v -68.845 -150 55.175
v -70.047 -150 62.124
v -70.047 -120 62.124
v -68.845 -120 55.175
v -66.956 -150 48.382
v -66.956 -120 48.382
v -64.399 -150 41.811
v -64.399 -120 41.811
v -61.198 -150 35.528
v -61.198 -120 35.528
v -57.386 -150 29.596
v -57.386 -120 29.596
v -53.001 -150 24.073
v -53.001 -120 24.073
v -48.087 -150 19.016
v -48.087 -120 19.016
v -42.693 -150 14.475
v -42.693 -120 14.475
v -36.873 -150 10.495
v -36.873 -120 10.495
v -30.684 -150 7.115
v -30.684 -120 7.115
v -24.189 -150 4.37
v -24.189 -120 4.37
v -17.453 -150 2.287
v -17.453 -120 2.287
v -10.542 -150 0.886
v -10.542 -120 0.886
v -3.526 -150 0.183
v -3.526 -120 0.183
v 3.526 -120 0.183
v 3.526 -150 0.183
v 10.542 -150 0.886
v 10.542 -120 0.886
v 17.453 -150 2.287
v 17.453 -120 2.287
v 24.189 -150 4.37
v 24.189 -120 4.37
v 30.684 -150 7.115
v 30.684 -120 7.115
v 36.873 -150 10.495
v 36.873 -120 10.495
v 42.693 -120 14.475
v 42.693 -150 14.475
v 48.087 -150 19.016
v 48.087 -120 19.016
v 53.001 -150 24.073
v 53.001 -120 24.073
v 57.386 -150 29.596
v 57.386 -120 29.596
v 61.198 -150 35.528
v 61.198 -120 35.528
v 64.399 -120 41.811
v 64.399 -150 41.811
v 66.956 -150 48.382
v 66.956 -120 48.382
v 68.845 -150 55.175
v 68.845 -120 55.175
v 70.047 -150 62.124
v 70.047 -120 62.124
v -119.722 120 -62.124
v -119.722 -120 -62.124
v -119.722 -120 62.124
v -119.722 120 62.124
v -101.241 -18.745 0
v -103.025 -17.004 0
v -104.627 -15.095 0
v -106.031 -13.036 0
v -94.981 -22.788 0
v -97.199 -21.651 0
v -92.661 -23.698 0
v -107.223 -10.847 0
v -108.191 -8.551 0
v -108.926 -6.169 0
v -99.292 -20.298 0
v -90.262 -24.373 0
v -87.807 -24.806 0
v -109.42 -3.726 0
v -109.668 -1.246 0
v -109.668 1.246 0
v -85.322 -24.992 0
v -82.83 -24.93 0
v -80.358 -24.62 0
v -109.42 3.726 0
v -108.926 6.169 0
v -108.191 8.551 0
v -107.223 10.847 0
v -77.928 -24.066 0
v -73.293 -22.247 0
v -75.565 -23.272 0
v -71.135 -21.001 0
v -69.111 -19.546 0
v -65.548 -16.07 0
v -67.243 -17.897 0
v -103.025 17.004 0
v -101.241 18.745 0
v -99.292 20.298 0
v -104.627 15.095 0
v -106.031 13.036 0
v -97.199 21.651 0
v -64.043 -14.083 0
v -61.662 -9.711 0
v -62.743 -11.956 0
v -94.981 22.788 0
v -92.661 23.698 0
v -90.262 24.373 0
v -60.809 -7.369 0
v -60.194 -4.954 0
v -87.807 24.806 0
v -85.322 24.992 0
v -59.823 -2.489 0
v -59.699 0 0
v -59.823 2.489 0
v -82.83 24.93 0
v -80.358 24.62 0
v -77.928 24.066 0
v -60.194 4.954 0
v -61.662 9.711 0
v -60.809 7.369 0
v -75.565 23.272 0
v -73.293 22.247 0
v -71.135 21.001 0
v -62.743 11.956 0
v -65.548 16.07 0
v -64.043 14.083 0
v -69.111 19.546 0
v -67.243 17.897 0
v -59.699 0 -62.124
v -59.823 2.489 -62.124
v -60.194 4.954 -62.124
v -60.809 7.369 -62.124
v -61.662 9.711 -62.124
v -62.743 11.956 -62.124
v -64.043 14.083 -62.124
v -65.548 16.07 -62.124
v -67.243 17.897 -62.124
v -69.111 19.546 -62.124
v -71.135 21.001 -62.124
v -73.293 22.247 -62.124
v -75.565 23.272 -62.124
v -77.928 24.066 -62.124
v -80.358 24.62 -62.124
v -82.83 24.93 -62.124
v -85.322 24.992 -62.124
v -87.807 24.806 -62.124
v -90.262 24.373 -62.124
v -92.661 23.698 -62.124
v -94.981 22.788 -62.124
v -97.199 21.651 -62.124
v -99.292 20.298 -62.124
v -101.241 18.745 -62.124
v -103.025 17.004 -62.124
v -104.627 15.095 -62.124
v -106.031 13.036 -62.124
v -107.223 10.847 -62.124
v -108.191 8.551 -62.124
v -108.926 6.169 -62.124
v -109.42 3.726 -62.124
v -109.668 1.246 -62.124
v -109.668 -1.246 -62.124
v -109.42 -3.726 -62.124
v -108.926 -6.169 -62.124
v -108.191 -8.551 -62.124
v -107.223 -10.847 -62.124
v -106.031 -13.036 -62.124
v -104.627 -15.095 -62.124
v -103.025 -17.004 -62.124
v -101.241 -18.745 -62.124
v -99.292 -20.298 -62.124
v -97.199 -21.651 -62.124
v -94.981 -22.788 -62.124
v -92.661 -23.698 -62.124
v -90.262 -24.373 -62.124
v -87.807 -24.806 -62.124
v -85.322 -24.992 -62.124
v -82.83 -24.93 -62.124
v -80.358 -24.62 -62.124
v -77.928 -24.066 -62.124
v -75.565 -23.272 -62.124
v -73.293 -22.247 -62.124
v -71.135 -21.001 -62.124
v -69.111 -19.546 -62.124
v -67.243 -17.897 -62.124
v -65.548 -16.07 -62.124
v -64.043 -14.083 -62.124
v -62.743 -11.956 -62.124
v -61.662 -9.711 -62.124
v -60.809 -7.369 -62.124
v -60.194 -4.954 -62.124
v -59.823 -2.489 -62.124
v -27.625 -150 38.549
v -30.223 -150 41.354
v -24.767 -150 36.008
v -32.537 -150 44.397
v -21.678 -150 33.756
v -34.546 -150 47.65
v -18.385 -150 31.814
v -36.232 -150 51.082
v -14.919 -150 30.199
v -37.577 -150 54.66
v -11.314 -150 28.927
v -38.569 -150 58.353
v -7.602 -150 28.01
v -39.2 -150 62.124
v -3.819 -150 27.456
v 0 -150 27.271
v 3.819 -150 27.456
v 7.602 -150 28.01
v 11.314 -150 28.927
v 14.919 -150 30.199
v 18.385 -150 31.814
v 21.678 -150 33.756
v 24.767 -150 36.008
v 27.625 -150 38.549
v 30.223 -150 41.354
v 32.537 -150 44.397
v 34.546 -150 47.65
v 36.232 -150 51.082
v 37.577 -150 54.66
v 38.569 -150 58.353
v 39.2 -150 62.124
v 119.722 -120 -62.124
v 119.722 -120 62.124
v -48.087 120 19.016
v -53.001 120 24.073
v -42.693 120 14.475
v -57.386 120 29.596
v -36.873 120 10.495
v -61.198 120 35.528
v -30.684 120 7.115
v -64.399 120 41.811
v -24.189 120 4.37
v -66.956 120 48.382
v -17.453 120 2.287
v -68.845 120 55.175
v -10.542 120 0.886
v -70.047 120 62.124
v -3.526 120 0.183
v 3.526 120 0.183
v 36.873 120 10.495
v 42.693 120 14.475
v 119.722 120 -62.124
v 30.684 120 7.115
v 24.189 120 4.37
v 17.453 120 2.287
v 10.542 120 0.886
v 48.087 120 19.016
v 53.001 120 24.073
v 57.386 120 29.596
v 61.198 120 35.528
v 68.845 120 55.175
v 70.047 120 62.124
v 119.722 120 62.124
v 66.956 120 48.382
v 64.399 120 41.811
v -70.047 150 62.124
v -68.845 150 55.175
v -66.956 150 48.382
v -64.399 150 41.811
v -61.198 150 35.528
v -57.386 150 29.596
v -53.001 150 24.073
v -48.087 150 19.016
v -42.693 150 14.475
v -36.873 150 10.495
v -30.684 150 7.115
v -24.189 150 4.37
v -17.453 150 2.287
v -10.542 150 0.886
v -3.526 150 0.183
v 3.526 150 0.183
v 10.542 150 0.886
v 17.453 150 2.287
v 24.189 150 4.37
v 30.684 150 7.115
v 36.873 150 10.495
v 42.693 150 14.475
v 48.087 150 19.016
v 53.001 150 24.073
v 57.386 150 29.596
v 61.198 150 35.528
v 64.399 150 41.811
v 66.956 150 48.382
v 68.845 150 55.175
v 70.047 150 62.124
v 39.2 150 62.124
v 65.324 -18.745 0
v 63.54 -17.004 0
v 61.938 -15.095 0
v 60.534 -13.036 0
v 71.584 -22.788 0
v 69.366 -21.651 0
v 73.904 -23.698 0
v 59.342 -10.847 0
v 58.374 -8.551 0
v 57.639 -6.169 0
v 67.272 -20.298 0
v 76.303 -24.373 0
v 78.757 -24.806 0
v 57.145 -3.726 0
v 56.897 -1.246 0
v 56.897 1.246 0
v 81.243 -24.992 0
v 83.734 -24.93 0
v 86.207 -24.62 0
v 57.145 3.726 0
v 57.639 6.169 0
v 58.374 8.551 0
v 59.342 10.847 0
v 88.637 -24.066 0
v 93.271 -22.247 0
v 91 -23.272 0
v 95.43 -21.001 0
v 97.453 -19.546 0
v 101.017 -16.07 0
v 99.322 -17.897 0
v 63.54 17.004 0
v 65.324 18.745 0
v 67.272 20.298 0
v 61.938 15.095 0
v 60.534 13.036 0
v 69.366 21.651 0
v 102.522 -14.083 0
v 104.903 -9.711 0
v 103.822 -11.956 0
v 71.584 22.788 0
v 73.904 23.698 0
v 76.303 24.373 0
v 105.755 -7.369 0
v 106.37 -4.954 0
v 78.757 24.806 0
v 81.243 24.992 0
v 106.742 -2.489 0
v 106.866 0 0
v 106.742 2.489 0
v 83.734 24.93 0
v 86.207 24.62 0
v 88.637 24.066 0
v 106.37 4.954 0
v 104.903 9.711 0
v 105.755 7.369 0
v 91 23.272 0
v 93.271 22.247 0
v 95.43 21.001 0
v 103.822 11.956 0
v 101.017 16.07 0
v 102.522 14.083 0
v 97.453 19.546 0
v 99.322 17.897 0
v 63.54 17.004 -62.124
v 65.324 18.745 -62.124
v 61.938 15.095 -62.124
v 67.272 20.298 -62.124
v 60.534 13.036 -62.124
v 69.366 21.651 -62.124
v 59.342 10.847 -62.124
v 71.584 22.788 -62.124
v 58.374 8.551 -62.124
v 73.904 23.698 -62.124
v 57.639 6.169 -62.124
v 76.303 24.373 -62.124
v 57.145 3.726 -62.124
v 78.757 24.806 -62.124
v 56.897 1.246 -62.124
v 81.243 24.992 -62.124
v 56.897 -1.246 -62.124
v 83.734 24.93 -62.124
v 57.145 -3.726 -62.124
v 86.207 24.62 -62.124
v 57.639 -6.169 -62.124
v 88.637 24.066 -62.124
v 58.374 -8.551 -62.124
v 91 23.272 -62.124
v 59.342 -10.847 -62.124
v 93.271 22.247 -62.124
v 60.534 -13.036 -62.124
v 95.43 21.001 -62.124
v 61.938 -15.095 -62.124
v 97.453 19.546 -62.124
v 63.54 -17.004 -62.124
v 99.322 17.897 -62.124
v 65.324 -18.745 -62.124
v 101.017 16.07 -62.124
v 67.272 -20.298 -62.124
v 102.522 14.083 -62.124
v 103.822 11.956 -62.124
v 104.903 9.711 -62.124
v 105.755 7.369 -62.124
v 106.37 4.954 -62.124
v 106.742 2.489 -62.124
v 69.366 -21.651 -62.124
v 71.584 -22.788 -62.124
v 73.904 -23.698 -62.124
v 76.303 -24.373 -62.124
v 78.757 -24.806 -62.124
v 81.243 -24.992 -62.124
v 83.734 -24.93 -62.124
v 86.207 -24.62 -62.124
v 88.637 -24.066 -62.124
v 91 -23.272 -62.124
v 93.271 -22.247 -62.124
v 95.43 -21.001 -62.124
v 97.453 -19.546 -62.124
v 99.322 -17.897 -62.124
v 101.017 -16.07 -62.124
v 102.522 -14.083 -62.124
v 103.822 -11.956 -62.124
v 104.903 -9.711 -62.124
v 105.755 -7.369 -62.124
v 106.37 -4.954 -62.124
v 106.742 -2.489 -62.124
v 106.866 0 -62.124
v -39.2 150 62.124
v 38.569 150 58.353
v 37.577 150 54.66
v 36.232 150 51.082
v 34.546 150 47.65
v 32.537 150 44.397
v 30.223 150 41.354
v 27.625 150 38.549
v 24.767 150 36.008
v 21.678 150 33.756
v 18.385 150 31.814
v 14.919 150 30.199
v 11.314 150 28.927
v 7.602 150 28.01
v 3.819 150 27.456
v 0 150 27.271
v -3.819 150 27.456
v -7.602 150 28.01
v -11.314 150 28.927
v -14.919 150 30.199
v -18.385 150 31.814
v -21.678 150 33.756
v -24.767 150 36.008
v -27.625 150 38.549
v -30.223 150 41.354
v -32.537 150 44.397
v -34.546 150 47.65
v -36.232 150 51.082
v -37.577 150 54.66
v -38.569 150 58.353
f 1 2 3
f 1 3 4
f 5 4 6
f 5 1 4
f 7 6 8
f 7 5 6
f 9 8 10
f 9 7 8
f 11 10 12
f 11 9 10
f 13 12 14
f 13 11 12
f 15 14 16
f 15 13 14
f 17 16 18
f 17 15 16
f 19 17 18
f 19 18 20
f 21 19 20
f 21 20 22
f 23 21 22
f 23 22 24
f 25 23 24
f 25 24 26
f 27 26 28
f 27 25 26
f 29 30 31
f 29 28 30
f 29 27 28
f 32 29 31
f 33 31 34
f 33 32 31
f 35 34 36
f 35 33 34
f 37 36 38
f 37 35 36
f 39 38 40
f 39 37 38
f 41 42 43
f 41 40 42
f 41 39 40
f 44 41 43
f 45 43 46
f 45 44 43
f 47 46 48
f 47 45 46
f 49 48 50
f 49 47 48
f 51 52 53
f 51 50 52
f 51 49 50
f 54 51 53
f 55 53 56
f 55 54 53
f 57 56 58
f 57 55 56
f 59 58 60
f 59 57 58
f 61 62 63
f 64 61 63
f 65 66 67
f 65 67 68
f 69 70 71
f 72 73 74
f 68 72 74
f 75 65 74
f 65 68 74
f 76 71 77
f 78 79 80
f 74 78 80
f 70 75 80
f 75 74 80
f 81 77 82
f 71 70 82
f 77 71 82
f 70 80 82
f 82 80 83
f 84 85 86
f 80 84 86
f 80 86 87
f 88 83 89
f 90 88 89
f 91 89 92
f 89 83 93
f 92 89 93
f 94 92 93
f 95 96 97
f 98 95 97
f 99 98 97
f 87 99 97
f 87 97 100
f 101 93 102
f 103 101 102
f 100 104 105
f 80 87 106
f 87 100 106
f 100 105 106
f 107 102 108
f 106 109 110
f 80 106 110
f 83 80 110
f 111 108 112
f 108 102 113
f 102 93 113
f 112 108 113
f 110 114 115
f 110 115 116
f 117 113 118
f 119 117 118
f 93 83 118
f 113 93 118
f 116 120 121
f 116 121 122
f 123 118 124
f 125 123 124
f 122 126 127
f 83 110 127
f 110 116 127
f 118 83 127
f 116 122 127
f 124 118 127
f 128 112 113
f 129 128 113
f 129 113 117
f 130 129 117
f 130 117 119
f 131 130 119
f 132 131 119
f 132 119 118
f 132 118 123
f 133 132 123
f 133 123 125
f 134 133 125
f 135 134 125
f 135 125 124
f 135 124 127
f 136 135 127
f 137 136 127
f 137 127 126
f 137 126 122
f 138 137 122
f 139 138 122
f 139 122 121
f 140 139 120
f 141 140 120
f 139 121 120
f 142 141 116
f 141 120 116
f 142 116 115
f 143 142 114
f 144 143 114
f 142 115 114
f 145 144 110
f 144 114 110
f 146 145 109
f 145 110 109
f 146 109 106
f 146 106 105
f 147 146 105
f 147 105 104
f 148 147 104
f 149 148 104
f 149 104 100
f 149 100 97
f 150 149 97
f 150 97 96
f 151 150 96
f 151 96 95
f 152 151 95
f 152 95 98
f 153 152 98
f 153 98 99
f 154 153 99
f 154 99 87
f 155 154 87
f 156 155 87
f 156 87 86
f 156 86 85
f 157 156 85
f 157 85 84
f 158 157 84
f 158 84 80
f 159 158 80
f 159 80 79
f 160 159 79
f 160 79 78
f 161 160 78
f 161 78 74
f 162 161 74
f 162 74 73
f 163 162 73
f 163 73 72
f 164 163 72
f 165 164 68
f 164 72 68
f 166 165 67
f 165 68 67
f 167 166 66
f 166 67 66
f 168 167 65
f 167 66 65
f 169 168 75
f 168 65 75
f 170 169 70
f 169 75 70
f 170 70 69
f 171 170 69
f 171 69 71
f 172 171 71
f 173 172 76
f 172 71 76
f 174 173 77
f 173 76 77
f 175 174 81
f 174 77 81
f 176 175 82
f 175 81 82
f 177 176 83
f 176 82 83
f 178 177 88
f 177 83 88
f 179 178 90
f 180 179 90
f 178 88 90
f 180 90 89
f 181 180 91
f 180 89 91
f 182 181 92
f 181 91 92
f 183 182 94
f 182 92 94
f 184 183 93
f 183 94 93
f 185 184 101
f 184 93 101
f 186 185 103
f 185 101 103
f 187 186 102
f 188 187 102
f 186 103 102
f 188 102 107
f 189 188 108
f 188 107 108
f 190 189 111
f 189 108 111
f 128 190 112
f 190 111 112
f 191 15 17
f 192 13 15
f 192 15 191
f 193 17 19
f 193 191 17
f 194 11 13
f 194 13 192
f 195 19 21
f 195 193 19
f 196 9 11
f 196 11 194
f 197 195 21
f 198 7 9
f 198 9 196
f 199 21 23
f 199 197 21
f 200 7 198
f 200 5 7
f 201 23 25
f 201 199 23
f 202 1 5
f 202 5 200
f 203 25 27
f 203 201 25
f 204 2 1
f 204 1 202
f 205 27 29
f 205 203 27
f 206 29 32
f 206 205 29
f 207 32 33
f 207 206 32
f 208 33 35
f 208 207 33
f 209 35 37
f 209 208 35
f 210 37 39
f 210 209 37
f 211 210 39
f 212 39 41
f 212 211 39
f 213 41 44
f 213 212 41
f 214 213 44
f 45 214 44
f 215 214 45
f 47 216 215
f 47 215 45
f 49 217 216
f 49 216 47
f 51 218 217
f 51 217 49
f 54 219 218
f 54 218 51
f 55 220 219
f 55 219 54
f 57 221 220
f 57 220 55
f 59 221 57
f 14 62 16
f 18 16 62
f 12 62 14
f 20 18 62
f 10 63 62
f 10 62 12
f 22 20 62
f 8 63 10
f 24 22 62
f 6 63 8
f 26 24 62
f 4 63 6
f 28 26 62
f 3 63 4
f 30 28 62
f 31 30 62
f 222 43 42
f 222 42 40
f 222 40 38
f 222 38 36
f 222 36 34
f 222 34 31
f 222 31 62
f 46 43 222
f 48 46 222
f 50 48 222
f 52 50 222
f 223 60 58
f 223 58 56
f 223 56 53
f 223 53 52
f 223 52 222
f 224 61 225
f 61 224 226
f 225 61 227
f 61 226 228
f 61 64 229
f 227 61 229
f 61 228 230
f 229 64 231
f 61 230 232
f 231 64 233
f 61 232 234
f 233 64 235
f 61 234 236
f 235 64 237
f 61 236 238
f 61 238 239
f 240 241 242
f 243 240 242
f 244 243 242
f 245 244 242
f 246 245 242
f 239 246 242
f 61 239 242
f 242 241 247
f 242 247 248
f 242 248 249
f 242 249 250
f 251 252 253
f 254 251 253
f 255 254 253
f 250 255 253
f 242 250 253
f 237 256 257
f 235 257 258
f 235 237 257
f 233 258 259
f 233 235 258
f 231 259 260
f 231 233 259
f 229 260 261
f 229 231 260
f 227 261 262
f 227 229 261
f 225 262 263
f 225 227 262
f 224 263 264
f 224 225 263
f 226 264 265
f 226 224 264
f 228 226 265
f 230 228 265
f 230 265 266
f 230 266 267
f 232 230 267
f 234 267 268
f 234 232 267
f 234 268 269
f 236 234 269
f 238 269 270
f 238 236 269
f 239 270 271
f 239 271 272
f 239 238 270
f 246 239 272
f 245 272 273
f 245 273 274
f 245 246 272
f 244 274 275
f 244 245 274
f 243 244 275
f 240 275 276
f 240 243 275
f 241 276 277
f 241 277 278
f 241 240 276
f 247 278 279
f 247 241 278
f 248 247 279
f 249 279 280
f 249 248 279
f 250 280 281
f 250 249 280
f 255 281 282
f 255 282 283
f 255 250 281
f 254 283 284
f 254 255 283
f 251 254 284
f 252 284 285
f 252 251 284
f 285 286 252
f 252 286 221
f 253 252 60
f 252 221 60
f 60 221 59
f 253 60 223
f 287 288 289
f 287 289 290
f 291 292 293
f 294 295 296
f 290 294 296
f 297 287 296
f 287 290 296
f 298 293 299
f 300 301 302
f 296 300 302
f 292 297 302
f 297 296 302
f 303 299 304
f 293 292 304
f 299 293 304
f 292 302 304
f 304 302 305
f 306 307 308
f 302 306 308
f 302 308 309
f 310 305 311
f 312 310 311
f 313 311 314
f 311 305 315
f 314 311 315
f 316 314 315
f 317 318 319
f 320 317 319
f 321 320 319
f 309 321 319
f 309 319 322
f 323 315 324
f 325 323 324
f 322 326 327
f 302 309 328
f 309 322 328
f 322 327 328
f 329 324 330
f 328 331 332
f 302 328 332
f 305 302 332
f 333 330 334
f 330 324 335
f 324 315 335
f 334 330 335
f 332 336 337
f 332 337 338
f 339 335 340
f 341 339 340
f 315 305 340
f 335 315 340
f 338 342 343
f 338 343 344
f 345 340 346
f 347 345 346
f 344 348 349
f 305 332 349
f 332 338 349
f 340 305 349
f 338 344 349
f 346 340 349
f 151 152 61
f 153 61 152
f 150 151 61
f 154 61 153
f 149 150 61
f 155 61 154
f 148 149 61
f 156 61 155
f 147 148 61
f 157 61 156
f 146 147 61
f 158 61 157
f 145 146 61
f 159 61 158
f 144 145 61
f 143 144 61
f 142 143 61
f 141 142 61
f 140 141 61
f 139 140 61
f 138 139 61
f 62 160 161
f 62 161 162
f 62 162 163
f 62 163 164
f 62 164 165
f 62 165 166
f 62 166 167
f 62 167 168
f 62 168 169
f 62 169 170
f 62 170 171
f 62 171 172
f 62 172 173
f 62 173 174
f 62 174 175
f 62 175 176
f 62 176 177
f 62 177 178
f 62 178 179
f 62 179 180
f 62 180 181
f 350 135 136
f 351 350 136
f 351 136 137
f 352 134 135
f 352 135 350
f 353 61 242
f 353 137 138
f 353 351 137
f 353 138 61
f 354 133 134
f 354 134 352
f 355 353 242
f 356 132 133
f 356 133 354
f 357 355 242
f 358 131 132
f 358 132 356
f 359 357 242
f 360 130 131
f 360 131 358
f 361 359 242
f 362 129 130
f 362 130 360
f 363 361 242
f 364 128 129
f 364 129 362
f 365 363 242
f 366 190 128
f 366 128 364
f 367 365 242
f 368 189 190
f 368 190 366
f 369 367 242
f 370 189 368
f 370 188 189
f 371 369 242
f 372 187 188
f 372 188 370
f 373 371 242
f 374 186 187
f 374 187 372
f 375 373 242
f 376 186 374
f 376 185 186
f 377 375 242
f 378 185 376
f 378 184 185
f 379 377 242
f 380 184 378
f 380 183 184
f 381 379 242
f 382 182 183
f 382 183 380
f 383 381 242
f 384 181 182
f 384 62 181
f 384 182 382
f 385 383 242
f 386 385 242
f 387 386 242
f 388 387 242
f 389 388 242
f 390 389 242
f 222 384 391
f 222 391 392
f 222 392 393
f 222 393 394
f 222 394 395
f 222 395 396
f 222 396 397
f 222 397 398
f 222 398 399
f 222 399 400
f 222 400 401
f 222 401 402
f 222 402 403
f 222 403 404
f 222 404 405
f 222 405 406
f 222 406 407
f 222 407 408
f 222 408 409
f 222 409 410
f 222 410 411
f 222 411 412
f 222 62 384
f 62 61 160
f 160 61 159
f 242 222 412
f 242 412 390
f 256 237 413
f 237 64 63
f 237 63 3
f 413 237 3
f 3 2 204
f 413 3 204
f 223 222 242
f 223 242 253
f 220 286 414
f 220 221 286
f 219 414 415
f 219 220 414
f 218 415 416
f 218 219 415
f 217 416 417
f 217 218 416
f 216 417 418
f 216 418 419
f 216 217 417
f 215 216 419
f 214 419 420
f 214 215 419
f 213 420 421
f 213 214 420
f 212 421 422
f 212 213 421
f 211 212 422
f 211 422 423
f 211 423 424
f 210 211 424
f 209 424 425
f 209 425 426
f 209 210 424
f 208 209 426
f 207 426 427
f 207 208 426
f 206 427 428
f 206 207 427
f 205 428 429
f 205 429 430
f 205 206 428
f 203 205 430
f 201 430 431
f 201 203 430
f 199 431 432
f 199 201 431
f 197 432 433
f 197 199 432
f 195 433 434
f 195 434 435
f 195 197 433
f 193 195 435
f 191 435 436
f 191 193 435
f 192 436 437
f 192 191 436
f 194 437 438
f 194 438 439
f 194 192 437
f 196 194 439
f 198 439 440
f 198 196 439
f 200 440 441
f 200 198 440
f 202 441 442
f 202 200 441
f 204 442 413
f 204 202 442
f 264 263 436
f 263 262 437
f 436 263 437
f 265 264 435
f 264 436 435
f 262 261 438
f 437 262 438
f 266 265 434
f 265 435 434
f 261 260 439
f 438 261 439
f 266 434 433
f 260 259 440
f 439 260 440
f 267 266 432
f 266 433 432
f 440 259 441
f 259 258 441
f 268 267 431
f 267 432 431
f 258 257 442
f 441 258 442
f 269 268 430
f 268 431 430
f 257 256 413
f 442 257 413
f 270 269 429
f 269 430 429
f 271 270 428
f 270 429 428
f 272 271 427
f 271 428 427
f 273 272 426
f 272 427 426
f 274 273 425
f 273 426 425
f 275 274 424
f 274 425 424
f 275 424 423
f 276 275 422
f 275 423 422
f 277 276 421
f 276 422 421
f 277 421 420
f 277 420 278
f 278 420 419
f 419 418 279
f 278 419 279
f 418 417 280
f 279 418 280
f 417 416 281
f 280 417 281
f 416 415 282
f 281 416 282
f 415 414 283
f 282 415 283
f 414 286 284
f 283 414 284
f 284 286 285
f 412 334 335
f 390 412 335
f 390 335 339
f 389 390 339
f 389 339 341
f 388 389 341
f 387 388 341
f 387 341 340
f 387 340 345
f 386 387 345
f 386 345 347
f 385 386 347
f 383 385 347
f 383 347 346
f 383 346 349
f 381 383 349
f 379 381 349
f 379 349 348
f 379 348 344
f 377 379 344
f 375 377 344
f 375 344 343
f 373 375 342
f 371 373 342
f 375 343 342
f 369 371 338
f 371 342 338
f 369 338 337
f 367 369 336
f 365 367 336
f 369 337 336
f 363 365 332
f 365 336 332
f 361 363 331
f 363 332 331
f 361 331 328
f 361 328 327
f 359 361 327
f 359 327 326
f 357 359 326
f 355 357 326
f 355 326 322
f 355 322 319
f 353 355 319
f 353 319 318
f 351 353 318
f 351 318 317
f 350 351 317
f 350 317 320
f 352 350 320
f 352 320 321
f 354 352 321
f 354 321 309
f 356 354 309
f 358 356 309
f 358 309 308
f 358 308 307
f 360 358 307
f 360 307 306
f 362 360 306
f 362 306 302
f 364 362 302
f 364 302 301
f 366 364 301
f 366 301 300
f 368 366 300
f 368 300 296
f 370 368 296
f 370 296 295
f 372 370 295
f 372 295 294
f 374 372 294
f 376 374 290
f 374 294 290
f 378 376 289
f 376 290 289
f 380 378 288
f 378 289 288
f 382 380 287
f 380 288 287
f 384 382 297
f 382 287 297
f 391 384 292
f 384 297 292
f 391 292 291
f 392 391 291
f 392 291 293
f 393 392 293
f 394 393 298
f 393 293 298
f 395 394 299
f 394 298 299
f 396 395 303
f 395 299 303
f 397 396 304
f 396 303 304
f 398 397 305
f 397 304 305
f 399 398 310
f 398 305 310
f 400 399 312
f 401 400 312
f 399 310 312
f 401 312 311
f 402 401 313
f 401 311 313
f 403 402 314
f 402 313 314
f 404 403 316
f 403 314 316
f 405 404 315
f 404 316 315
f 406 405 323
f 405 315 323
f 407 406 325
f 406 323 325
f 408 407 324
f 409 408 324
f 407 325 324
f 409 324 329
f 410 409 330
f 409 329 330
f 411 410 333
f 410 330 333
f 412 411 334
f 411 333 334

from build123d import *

# Parameters (mm, degrees)
F1_DEPTH      = 150
F1_DEPTH_BACK = 150
F0_W          = 49.6755242348
F0_H          = 124.2471858859
F2_DEPTH      = 120
F2_DEPTH_BACK = 120
F4_D          = 50
F4_DEPTH      = 62.124592943


with BuildPart() as f1:
    # F0 (on Front) → F1 (new body, two sides)
    with BuildSketch(Plane.XZ) as f1_sk:
        with BuildLine():
            Line((-39.2000116408, 62.123592943), (-70.0469091535, 62.123592943))
            ThreePointArc((-70.0469091535, 62.123592943), (0, 0.0945745131), (70.0469091535, 62.123592943))
            Line((70.0469091535, 62.123592943), (39.2000116408, 62.123592943))
            Line((39.2000116408, 62.123592943), (39.2000116408, 26.8699936569))
            Line((39.2000116408, 26.8699936569), (-39.2000116408, 26.8699936569))
            Line((-39.2000116408, 26.8699936569), (-39.2000116408, 62.123592943))
        make_face()
        with BuildLine():
            ThreePointArc((39.2000116408, 62.123592943), (0, 27.2705569476), (-39.2000116408, 62.123592943))
            Line((-39.2000116408, 62.123592943), (-39.2000116408, 26.8699936569))
            Line((-39.2000116408, 26.8699936569), (39.2000116408, 26.8699936569))
            Line((39.2000116408, 26.8699936569), (39.2000116408, 62.123592943))
        make_face()
    extrude(amount=F1_DEPTH)
    extrude(f1_sk.sketch, amount=-F1_DEPTH_BACK)

    # F0 (on Front) → F2 (join, two sides)
    with BuildSketch(Plane.XZ) as f2_sk:
        with Locations((-94.8846712708, 0)):
            Rectangle(F0_W, F0_H)
        with BuildLine():
            ThreePointArc((70.0469091535, 62.123592943), (0, 0.0945745131), (-70.0469091535, 62.123592943))
            Line((-70.0469091535, 62.123592943), (-70.0469091535, -62.123592943))
            Line((-70.0469091535, -62.123592943), (70.0469091535, -62.123592943))
            Line((70.0469091535, -62.123592943), (70.0469091535, 62.123592943))
        make_face()
        with Locations((94.8846712708, 0)):
            Rectangle(F0_W, F0_H)
    extrude(amount=F2_DEPTH)
    extrude(f2_sk.sketch, amount=-F2_DEPTH_BACK)

    # F4 (through all, one way)
    with BuildSketch(Plane.XY):
        with Locations((-84.6987441182, 0), (81.8660110235, 0)):
            Circle(F4_D / 2)
    extrude(amount=-F4_DEPTH, mode=Mode.SUBTRACT)


solid = f1.part
